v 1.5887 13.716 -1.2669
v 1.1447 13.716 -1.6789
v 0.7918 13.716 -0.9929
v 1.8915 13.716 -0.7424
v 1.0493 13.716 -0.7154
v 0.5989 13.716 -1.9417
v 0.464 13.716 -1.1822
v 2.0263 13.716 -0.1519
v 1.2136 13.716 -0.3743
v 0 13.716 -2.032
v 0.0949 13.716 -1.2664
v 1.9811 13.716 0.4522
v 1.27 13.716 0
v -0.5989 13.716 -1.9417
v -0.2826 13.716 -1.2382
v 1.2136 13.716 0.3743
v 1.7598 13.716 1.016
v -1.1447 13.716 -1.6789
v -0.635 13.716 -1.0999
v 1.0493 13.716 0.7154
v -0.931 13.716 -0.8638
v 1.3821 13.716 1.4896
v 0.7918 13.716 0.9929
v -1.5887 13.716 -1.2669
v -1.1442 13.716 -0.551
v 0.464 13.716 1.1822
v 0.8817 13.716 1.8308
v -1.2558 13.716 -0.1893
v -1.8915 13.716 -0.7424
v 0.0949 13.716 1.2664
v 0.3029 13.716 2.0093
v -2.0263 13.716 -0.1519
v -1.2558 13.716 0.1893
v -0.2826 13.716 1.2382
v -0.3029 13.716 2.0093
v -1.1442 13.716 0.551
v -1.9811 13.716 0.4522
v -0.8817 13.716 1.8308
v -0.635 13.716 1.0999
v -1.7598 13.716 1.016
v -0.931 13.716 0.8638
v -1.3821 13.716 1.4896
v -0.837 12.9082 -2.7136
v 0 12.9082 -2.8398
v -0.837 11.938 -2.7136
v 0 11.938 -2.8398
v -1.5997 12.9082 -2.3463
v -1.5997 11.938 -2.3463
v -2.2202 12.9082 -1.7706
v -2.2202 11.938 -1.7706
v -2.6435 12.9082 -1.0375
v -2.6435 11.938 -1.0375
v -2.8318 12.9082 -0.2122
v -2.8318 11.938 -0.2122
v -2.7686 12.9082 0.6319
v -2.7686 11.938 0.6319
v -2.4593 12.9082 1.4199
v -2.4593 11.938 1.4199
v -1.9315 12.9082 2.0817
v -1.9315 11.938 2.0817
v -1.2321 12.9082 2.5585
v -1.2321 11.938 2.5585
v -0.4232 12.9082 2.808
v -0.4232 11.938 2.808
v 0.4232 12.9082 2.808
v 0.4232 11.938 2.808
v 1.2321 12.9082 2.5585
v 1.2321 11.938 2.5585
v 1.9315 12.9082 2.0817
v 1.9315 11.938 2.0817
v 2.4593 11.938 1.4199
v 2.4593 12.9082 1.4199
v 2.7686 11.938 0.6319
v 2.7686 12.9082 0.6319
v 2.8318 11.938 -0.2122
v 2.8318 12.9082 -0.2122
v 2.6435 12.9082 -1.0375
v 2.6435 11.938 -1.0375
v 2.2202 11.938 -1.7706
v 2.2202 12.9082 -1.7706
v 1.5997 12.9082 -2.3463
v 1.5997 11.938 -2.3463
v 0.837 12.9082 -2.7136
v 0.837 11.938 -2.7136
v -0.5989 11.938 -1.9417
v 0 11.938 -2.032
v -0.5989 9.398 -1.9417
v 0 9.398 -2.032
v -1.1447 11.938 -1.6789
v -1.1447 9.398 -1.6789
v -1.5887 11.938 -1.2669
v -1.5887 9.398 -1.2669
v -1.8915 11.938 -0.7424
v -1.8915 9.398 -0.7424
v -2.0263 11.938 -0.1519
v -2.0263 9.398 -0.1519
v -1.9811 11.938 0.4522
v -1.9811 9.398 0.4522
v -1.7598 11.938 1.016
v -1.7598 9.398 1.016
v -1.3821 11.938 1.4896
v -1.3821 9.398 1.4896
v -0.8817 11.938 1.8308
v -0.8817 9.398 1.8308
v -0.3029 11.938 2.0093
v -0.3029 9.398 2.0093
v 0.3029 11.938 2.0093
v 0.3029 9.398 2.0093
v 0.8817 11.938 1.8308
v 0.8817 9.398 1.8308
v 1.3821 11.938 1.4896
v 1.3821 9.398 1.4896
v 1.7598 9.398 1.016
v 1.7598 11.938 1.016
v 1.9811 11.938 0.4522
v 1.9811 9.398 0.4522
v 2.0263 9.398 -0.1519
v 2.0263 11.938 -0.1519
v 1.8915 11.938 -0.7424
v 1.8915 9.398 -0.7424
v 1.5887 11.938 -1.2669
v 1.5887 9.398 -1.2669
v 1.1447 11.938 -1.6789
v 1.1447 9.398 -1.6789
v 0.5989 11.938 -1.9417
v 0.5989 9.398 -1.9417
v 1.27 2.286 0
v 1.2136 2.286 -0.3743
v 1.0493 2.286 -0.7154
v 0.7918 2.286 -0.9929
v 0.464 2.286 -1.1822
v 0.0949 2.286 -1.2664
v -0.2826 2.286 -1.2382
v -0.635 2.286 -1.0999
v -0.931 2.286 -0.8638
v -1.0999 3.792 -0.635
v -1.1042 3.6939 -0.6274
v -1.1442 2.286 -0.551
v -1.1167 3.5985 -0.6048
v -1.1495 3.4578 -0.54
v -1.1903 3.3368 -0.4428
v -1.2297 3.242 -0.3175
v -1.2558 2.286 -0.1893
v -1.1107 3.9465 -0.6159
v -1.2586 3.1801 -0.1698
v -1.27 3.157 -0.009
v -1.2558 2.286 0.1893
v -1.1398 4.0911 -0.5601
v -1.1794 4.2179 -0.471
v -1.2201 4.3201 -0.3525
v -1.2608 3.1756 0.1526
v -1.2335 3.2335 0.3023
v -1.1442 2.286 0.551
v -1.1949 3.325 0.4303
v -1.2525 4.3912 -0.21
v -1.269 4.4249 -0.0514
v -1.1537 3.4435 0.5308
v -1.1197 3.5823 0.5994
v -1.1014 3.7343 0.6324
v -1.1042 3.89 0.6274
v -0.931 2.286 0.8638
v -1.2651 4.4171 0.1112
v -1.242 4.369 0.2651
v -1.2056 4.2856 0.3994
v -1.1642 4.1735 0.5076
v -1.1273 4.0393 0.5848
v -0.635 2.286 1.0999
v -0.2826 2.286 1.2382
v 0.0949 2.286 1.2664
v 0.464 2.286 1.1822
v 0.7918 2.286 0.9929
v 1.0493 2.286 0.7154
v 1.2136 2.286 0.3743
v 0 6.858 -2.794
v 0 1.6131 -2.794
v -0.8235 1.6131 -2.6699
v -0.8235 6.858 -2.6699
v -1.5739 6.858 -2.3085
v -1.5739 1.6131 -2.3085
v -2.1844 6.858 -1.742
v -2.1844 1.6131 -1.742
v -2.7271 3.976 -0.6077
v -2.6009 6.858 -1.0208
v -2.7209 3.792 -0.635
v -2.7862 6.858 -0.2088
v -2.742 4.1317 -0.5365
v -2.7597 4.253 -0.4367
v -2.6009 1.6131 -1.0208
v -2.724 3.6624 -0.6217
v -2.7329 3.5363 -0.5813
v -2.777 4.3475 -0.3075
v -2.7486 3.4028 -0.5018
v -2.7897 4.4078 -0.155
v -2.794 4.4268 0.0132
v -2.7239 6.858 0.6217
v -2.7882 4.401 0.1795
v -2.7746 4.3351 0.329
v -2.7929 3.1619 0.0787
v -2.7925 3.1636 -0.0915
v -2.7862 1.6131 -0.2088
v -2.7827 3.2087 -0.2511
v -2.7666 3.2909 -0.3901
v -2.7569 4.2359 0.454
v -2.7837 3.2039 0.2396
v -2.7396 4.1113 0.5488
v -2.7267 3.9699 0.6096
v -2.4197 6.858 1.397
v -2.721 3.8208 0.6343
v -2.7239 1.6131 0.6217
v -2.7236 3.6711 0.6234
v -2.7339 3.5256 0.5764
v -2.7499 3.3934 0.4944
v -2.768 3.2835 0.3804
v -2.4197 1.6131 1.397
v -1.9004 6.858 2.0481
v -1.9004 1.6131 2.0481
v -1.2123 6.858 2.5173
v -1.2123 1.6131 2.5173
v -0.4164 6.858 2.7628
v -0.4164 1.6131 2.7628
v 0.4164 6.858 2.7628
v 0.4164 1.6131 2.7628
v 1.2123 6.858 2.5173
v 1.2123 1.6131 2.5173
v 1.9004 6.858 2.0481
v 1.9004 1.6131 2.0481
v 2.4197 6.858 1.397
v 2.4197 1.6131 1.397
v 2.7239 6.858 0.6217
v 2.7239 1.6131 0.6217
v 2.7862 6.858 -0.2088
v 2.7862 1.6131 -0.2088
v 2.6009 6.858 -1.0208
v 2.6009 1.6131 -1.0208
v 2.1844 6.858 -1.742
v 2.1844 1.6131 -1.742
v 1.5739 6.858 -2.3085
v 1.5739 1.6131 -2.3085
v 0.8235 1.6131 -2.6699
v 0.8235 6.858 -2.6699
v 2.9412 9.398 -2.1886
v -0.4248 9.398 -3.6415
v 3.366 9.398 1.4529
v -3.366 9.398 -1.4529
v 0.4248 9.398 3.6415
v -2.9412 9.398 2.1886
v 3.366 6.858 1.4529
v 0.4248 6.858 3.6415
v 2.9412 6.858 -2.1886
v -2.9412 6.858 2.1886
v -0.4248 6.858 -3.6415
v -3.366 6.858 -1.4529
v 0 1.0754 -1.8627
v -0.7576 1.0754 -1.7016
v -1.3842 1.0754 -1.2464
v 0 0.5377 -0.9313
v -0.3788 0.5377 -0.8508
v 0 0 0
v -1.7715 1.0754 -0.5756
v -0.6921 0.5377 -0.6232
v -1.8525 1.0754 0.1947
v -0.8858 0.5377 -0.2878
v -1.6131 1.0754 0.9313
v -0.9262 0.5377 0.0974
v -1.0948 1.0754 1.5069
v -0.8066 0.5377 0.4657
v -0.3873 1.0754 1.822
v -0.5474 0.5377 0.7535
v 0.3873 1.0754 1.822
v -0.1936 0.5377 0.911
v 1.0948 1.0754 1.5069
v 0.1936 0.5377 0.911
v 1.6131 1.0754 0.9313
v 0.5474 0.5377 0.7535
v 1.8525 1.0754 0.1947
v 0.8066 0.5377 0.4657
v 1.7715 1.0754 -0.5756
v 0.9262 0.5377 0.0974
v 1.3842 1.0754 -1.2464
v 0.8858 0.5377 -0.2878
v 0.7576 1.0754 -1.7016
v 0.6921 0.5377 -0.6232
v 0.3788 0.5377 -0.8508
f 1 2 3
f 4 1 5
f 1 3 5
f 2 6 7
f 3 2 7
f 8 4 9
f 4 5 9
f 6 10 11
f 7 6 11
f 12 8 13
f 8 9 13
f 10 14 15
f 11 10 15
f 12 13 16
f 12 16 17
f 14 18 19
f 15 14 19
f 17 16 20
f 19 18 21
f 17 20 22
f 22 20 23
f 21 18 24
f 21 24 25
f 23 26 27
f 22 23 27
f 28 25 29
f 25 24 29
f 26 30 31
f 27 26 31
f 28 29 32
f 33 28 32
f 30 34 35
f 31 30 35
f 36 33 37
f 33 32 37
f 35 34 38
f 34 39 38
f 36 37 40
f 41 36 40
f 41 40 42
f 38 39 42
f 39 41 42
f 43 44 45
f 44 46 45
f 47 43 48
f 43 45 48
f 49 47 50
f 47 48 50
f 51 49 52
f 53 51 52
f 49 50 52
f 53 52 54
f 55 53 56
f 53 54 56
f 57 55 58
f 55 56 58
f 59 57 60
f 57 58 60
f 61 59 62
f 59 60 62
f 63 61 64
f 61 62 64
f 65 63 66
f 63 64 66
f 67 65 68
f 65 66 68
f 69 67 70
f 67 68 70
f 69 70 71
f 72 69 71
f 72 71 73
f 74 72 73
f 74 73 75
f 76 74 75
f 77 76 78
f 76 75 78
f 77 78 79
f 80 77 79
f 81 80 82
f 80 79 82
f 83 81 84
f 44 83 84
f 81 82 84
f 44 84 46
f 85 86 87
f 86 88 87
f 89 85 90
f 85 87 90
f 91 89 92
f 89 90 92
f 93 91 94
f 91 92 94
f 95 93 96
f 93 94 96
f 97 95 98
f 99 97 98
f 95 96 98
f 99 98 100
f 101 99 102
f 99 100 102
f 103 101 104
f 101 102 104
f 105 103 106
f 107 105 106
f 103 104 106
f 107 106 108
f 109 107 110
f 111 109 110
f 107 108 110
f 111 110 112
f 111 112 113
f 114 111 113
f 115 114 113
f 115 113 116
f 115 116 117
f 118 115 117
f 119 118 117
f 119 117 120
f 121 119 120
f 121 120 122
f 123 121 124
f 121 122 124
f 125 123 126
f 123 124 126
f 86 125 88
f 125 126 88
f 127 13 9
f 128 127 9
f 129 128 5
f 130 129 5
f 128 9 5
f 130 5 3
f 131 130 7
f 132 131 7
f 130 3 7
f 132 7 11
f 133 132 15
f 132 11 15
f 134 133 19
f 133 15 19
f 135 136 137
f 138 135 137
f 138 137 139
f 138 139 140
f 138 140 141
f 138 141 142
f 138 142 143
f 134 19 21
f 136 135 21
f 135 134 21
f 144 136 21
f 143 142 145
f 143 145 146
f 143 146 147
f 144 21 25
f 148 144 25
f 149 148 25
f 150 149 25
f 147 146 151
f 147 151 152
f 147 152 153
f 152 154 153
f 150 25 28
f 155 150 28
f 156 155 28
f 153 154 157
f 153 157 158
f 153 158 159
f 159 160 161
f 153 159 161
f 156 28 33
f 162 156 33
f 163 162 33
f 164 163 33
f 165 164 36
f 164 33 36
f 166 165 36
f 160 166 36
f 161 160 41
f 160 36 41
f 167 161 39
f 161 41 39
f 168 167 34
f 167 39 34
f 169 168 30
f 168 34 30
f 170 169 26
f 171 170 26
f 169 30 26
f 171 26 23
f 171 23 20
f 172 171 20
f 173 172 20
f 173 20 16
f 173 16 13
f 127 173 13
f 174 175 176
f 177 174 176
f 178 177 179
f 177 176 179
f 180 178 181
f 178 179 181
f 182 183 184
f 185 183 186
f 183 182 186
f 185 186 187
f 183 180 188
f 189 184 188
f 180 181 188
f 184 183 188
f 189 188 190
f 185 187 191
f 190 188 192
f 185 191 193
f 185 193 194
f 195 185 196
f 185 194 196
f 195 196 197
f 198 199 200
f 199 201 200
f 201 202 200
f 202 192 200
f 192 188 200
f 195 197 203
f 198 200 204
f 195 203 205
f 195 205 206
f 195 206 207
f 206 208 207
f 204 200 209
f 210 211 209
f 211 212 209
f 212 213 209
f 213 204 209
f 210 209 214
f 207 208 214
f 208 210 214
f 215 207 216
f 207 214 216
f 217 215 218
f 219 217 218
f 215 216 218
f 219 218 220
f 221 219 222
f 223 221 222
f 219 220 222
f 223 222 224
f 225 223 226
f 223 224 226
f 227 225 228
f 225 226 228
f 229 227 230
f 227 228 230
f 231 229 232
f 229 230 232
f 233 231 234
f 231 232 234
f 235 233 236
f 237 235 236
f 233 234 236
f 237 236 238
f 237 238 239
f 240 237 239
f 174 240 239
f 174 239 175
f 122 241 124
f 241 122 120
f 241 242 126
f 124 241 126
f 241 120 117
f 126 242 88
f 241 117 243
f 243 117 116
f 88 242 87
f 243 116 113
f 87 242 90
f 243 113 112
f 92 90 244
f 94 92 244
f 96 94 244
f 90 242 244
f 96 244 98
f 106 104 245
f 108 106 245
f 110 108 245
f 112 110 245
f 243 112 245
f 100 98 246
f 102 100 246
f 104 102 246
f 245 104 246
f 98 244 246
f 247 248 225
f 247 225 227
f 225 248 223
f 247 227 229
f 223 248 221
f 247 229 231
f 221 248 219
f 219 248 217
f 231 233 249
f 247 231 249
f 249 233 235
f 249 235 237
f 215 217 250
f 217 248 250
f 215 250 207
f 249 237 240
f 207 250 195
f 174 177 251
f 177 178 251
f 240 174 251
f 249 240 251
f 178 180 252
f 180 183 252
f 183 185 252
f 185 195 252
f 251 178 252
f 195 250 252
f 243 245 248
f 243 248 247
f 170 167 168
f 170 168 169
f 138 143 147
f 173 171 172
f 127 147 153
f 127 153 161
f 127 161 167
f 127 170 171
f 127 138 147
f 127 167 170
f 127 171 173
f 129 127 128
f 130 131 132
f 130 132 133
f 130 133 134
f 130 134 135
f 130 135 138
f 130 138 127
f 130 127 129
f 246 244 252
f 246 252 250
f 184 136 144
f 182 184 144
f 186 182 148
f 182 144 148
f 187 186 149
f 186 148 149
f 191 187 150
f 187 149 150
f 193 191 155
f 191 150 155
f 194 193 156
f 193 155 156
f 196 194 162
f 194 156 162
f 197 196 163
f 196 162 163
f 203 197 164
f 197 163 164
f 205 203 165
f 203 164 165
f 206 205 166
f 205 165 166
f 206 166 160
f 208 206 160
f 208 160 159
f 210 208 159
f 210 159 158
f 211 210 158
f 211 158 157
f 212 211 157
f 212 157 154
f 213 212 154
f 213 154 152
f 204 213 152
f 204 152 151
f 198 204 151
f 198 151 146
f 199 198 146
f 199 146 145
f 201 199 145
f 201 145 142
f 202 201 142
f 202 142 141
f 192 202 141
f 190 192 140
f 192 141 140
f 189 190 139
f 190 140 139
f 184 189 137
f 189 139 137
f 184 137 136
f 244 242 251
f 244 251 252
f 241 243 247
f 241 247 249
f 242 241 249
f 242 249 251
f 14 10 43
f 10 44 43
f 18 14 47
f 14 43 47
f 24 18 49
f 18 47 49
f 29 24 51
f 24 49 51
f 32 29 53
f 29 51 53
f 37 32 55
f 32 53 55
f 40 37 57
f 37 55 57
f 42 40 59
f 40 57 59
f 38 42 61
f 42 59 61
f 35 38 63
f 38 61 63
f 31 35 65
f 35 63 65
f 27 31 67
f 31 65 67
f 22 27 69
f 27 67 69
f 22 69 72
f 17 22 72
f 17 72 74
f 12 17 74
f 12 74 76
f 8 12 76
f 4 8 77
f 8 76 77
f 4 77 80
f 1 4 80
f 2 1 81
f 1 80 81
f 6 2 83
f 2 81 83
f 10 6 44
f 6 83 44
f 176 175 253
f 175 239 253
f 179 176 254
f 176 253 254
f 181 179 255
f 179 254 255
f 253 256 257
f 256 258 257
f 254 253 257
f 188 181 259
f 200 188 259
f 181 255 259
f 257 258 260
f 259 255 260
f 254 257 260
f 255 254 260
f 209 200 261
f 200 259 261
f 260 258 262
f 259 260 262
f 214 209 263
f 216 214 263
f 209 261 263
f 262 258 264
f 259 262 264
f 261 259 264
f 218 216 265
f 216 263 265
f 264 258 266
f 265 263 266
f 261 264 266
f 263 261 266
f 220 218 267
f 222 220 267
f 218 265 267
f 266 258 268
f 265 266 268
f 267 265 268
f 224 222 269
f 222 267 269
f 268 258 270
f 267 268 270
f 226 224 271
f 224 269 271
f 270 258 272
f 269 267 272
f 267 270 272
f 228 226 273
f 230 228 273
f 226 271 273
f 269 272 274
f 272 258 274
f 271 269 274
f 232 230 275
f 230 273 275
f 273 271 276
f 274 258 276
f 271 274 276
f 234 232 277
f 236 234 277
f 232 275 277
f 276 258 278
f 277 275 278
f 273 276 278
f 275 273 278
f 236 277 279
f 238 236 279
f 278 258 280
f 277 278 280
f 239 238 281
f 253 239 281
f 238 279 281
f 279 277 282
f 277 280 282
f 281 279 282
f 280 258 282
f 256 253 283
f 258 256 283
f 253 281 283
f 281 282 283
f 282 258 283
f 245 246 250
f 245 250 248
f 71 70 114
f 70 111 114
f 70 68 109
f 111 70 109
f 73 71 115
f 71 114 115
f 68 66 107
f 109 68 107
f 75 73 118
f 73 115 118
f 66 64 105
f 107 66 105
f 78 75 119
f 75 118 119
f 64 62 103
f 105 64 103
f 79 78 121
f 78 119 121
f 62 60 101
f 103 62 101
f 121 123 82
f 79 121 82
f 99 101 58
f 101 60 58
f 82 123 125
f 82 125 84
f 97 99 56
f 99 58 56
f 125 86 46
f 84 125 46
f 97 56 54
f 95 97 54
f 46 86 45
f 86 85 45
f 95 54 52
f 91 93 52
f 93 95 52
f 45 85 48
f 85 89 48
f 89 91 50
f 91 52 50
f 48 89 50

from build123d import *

# Parameters (mm, degrees)
SKETCH2_OUTSIDE_W  = 15.626
SKETCH2_OUTSIDE_H  = 15.626
CUT_EXTRUDE1_DEPTH = 2.54
SKETCH3_R          = 1.27
CUT_EXTRUDE2_DEPTH = 11.43
SKETCH4_R          = 0.635
CUT_EXTRUDE3_DEPTH = 11.43


with BuildPart() as part:
    # Sketch1 → Revolve2 (revolve)
    with BuildSketch(Plane(origin=(0, 0, 0), x_dir=(0, 0, -1), z_dir=(1, 0, 0))):
        Polygon((0, 0), (0, 13.716), (2.032, 13.716), (2.839757444, 12.908242556), (2.839757444, 11.938), (2.032, 11.938), (2.032, 9.398), (4.868925194, 9.398), (4.868925194, 6.858), (2.794, 6.858), (2.794, 1.613116652), align=None)
    revolve(axis=Axis((0, 0, 0), (0, 1, 0)))

    # Sketch2 outside → Cut-Extrude1 (cut)
    with BuildSketch(Plane(origin=(0, 9.398, 0), x_dir=(1, 0, 0), z_dir=(0, 1, 0))):
        Rectangle(SKETCH2_OUTSIDE_W, SKETCH2_OUTSIDE_H)
        Polygon((3.366014334, -1.452852654), (2.941214474, 2.188627596), (-0.424799861, 3.64148025), (-3.366014334, 1.452852654), (-2.941214474, -2.188627596), (0.424799861, -3.64148025), align=None, mode=Mode.SUBTRACT)
    extrude(amount=-CUT_EXTRUDE1_DEPTH, mode=Mode.SUBTRACT)

    # Sketch3 → Cut-Extrude2 (cut)
    with BuildSketch(Plane(origin=(0, 13.716, 0), x_dir=(1, 0, 0), z_dir=(0, 1, 0))):
        Circle(SKETCH3_R)
    extrude(amount=-CUT_EXTRUDE2_DEPTH, mode=Mode.SUBTRACT)

    # Sketch4 → Cut-Extrude3 (cut)
    with BuildSketch(Plane(origin=(0, 0, 0), x_dir=(0, 0, -1), z_dir=(1, 0, 0))):
        with Locations((0, 3.79195236)):
            Circle(SKETCH4_R)
    extrude(amount=-CUT_EXTRUDE3_DEPTH, mode=Mode.SUBTRACT)


solid = part.part
